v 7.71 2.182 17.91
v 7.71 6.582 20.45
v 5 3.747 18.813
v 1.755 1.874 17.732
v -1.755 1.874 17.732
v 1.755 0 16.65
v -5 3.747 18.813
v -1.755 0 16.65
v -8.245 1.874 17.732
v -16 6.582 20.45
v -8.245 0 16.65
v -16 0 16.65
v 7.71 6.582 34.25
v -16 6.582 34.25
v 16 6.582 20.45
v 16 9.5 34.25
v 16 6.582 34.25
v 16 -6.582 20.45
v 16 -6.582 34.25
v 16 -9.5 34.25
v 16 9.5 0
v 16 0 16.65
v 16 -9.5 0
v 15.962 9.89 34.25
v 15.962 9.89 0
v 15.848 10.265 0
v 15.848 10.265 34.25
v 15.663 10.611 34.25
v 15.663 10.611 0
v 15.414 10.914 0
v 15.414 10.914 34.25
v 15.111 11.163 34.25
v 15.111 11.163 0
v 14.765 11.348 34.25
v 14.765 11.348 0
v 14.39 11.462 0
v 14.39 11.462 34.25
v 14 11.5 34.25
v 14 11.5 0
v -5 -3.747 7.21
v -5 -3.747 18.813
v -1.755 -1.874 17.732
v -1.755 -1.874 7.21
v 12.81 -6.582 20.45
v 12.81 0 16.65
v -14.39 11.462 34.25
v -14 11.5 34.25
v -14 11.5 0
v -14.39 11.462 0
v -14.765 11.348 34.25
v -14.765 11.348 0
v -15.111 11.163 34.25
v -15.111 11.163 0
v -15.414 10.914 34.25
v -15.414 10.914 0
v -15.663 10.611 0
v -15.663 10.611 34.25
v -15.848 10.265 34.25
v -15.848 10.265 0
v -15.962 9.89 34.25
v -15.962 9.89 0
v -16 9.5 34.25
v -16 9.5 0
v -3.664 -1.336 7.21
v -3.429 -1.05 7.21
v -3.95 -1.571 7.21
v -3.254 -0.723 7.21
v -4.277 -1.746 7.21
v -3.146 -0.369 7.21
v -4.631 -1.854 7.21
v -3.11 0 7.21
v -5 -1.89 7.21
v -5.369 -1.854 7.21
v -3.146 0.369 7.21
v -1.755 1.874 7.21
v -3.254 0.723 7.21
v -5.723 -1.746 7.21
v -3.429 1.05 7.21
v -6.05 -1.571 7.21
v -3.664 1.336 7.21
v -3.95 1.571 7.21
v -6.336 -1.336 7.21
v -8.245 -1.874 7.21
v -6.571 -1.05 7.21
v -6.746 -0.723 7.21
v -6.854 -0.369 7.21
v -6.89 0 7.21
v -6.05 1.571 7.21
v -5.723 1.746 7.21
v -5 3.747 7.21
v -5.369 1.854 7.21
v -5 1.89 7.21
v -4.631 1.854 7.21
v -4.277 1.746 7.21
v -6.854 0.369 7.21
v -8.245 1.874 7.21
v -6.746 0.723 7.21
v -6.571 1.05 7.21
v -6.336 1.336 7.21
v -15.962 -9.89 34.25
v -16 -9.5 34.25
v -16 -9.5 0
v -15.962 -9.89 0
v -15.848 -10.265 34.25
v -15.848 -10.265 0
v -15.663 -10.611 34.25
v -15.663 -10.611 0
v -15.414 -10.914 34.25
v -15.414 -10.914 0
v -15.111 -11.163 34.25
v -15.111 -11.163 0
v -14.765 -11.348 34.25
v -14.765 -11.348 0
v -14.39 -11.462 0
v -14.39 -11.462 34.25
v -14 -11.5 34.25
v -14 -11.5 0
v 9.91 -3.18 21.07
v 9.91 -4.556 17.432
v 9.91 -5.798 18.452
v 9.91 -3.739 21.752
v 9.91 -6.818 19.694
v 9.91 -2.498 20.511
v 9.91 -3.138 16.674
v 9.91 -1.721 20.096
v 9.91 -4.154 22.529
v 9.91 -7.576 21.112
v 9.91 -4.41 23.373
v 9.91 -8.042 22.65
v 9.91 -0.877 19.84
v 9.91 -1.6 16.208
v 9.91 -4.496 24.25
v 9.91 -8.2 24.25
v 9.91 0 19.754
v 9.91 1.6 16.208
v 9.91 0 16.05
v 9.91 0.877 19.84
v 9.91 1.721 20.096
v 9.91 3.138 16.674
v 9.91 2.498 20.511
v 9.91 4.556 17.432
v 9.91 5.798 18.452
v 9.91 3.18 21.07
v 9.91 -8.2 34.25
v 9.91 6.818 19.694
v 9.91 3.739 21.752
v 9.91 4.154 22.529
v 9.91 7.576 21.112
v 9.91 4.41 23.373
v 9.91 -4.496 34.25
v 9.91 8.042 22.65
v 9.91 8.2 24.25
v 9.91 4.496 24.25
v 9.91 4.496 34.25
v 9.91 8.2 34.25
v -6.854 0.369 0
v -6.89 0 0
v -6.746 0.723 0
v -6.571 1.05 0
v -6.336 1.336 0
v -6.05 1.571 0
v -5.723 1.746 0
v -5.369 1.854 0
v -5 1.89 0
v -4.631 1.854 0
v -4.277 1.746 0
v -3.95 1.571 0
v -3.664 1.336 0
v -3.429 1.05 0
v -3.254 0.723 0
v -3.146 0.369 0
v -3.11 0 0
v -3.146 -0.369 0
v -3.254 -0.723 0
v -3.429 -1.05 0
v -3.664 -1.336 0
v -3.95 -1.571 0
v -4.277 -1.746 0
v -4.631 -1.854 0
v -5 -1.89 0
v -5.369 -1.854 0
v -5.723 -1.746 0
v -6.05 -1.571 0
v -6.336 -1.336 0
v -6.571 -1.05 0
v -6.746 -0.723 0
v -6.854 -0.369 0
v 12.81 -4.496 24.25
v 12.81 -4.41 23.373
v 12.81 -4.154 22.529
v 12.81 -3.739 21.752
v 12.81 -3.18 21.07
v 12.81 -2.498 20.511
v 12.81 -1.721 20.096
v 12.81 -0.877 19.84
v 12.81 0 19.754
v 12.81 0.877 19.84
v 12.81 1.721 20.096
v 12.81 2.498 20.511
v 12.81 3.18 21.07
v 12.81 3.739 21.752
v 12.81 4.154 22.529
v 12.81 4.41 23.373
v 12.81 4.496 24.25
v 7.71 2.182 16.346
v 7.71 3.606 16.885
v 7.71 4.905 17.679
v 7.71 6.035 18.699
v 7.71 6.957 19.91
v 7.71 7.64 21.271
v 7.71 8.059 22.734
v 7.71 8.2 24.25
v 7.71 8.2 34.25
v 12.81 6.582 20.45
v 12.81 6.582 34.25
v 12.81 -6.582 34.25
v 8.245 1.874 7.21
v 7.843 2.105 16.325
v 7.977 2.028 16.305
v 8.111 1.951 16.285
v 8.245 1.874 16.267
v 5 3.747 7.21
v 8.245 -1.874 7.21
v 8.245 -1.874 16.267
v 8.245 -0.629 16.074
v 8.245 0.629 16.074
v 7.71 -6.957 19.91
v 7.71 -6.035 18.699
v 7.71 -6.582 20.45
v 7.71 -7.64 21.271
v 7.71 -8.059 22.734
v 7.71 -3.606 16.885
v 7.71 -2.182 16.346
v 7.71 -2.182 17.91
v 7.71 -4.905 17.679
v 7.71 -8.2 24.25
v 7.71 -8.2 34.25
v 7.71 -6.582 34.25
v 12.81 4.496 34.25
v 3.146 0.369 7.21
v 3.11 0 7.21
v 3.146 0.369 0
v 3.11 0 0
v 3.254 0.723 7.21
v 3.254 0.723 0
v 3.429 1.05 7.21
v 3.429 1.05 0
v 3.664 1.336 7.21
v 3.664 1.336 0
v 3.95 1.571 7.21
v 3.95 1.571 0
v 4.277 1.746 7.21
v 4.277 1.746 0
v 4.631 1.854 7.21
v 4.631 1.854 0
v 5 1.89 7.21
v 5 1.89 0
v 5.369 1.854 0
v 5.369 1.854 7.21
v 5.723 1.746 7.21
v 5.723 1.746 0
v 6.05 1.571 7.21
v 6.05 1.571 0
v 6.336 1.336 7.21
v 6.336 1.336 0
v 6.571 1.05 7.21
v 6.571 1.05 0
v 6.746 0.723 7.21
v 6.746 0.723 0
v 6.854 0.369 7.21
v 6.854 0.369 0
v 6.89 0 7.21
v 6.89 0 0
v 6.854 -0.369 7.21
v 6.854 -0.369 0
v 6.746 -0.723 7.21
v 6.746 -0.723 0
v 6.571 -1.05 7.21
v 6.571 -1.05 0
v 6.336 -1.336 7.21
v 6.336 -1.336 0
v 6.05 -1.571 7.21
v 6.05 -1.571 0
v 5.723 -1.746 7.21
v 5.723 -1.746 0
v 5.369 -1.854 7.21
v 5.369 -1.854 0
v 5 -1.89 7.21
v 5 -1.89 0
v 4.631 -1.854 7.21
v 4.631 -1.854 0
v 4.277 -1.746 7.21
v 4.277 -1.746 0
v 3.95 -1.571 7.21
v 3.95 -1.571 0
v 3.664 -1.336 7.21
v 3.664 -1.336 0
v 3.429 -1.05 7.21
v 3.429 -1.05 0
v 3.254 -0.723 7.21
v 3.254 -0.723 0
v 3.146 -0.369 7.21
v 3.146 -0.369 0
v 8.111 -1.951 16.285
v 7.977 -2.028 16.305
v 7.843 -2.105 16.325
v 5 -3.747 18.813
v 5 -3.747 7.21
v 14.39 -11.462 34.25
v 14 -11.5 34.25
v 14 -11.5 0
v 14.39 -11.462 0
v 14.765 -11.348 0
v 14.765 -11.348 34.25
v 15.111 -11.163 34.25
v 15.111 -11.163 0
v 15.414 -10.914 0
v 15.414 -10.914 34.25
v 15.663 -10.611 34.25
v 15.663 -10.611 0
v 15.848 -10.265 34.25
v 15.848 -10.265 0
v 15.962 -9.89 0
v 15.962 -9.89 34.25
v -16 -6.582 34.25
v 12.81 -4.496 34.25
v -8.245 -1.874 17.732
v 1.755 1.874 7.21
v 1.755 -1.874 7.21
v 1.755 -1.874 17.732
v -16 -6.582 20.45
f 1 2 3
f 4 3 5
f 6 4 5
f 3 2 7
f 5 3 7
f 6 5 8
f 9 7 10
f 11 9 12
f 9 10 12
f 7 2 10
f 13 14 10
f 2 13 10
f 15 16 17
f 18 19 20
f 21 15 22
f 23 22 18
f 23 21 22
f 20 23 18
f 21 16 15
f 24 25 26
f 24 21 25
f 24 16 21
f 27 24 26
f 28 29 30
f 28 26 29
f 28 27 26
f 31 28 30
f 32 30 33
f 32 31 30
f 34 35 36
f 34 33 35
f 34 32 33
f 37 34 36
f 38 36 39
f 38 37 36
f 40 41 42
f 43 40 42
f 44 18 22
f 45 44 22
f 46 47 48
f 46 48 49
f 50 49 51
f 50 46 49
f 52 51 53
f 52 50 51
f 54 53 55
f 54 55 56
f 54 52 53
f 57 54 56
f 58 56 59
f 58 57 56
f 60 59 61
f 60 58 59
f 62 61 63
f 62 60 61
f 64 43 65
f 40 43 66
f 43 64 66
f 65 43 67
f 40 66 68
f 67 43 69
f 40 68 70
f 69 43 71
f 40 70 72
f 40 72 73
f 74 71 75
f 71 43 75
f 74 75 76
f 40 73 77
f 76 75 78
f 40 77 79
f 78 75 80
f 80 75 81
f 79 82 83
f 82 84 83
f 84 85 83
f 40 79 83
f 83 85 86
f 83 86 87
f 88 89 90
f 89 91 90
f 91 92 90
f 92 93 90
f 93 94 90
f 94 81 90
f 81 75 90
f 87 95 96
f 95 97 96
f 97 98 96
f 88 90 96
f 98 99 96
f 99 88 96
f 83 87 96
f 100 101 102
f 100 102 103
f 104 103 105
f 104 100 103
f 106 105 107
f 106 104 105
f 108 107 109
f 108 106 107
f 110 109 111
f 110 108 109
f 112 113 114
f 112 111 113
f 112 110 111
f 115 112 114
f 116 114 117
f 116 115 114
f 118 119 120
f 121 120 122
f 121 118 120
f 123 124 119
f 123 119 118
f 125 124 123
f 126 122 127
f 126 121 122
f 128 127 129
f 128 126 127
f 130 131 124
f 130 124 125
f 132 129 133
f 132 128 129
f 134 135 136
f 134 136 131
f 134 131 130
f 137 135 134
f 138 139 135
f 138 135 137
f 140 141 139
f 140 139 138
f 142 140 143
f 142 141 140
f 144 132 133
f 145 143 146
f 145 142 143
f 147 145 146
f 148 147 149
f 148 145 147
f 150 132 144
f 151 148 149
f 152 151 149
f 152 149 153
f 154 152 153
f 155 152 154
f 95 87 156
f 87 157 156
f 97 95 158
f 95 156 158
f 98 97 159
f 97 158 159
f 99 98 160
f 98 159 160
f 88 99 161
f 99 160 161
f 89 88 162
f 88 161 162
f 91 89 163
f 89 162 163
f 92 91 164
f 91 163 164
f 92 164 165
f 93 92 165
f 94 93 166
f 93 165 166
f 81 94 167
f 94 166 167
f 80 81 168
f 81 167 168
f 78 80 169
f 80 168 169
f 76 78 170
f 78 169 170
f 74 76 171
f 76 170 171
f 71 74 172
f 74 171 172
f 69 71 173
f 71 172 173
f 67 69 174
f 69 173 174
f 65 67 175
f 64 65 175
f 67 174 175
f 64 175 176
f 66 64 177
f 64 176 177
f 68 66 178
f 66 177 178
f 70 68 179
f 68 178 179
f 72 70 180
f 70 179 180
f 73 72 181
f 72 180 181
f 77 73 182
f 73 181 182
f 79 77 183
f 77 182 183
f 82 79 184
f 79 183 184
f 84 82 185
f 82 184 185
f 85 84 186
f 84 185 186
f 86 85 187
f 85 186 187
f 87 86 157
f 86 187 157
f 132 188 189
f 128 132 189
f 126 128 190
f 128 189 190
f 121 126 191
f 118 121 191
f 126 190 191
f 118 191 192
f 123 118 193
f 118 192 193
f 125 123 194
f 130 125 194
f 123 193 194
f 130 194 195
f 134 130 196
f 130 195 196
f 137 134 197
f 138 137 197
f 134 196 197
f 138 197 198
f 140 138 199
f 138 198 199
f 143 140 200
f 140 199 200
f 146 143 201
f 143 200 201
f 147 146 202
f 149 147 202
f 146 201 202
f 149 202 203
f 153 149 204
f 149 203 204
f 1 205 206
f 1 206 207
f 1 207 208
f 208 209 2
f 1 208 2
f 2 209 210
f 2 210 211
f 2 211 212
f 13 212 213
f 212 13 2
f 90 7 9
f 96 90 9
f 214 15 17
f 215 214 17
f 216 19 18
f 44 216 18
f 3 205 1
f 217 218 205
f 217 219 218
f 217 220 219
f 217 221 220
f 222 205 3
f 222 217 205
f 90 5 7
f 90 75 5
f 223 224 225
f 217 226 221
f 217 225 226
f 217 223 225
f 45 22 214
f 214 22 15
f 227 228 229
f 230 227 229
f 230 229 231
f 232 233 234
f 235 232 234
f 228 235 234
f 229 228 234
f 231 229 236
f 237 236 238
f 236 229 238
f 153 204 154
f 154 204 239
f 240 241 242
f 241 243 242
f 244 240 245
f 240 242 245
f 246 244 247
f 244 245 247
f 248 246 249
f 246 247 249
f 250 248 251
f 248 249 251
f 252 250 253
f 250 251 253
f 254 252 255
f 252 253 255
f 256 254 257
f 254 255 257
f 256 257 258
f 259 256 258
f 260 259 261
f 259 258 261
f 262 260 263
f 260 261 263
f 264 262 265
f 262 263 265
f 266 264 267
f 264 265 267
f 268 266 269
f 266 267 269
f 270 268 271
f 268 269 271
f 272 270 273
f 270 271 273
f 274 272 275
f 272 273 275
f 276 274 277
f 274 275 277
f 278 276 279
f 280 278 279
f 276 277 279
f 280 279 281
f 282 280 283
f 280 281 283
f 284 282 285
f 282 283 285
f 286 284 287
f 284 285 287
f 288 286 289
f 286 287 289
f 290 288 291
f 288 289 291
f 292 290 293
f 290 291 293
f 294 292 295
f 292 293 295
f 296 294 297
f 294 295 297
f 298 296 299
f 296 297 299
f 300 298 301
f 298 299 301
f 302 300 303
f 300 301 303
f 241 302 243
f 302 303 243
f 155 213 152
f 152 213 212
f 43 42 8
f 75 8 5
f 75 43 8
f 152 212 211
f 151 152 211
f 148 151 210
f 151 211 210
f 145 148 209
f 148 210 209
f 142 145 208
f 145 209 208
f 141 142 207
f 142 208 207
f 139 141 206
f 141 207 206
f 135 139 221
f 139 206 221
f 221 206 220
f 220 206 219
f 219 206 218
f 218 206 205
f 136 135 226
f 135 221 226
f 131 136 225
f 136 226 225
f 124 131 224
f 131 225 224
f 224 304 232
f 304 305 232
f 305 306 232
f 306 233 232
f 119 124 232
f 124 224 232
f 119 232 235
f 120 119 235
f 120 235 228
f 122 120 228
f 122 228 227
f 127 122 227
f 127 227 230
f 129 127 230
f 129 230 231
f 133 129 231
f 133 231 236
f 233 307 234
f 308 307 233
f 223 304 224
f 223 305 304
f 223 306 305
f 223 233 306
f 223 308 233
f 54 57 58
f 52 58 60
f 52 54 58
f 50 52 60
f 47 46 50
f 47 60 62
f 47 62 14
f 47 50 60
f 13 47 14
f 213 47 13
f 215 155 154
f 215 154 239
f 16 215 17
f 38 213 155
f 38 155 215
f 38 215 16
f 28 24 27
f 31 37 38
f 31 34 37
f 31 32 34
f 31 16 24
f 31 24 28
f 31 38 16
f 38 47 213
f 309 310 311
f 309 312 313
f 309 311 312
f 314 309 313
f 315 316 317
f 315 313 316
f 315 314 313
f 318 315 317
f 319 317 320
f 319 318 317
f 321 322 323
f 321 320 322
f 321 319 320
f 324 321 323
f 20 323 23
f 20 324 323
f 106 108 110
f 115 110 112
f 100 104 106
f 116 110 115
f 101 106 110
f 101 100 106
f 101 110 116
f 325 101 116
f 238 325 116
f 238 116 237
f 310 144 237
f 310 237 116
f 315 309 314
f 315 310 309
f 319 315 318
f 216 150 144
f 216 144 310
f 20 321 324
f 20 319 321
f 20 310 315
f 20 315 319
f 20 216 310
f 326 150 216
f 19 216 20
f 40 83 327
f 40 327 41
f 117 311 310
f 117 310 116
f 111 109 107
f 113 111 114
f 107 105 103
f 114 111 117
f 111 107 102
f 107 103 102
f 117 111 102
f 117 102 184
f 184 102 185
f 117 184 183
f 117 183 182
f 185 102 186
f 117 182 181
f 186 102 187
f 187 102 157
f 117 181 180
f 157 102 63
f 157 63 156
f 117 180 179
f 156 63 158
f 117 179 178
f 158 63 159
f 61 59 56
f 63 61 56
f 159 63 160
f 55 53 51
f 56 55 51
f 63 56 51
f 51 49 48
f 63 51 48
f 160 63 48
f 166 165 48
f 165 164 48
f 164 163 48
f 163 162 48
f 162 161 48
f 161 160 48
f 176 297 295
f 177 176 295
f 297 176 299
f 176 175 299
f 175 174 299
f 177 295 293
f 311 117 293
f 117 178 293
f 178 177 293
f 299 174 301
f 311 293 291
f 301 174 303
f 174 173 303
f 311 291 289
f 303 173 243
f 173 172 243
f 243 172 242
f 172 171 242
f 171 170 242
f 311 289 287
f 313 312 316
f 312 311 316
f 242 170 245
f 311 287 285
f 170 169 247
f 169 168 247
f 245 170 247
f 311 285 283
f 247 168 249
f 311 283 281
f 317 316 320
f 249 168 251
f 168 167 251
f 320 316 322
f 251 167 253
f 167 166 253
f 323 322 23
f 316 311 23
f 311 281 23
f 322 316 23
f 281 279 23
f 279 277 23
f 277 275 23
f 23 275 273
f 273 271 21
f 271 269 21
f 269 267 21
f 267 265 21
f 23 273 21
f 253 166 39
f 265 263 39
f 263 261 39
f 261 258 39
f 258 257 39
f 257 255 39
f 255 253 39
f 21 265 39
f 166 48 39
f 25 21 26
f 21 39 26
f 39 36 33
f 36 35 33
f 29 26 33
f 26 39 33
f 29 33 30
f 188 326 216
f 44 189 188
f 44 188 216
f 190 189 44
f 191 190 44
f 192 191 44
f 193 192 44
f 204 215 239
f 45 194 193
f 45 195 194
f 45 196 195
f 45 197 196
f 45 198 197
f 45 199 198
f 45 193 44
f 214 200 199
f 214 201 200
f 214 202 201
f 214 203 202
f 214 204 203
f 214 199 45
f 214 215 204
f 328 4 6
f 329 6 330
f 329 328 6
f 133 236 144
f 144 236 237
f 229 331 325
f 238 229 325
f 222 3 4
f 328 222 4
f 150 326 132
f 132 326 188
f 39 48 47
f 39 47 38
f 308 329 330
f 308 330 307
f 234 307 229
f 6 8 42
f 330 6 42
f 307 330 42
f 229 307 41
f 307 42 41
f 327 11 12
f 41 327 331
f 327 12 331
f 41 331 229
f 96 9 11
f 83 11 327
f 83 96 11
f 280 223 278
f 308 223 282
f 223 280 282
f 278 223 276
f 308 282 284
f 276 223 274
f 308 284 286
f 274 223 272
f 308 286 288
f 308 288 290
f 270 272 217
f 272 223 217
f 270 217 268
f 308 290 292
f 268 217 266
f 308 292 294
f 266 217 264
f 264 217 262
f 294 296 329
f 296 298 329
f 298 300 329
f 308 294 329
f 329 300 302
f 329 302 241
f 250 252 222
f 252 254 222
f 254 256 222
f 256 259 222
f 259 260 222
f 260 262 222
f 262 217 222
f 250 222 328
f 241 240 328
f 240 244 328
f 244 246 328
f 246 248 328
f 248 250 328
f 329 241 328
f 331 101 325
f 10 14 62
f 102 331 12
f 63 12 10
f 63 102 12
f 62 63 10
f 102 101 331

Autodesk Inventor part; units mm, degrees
sketch "Boceto1" plane through (0, 0, 0) normal (0, 0, 1) x (1, 0, 0)
  line L0 (-16, 11.5) -> (16, 11.5)
  line L1 (16, 11.5) -> (16, -11.5)
  line L2 (16, -11.5) -> (-16, -11.5)
  line L3 (-16, -11.5) -> (-16, 11.5)
  point P0 (0, 0)
  point P1 (16, 0)
  point P2 (0, 11.5)
  dimension "d0" = 32
  dimension "d1" = 23
extrude "Extrusión1" add sketch "Boceto1" along normal blind 34.25
fillet "Empalme1" radius 2 4 edges at (16, -11.5, 17.125) (16, 11.5, 17.125) (-16, 11.5, 17.125) (-16, -11.5, 17.125)
sketch "Boceto2" plane through (16, -9.5, 0) normal (1, 0, 0) x (0, 0, -1)
  line L0 (-34.25, 0) -> (-34.25, 19) projected
  line L1 (-34.25, 2.918) -> (-20.45, 2.918)
  line L2 (-20.45, 2.918) -> (-16.6504, 9.5)
  line L3 (-16.6504, 9.5) -> (-20.45, 16.082)
  line L4 (-20.45, 16.082) -> (-34.25, 16.082)
  line L5 (-34.25, 2.918) -> (-34.25, 16.082)
  point P0 (0, 9.5)
  point P1 (-34.25, 9.5)
  dimension "d5" = 13.8
  dimension "d6" = 7.6
  dimension "d7" = 13.164
extrude "Extrusión2" cut sketch "Boceto2" against normal blind 3.19
sketch "Boceto3" plane through (12.81, -9.5, 0) normal (1, 0, 0) x (0, 0, -1)
  line L0 (-20.45, 2.918) -> (-34.25, 2.918) projected
  line L1 (-16.6504, 9.5) -> (-20.45, 2.918) projected
  line L2 (-20.45, 16.082) -> (-16.6504, 9.5) projected
  line L3 (-34.25, 16.082) -> (-20.45, 16.082) projected
  line L4 (-34.25, 2.918) -> (-34.25, 16.082) projected
  line L5 (-34.25, 5.0035) -> (-24.25, 5.0035)
  arc A0 (-24.25, 5.0035) -> (-24.25, 13.9965) centre (-24.25, 9.5) ccw
  line L6 (-24.25, 13.9965) -> (-34.25, 13.9965)
  line L7 (-34.25, 2.918) -> (-34.25, 16.082) projected
  line L8 (-34.25, 5.0035) -> (-34.25, 13.9965)
  point P0 (0, 9.5)
  point P1 (-34.25, 9.5)
  dimension "d10" = 10
  dimension "d11" = 8.993
extrude "Extrusión3" cut sketch "Boceto3" against normal blind 2.9 contours L4 L6 A0 L5
sketch "Boceto4" plane through (-16, -9.5, 0) normal (-1, 0, 0) x (0, 0, 1)
  line L0 (34.25, 16.082) -> (20.45, 16.082) projected
  line L1 (20.45, 16.082) -> (16.6504, 9.5) projected
  line L2 (16.6504, 9.5) -> (20.45, 2.918) projected
  line L3 (20.45, 2.918) -> (34.25, 2.918) projected
  line L4 (34.25, 16.082) -> (34.25, 2.918)
  line L5 (34.25, 0) -> (34.25, 2.918) projected
  point P0 (0, 9.5)
extrude "Extrusión4" cut sketch "Boceto4" against normal blind 23.71
sketch "Boceto5" plane through (7.71, -9.5, 0) normal (-1, 0, 0) x (0, 0, 1)
  line L0 (34.25, 17.7) -> (24.25, 17.7)
  arc A0 (24.25, 17.7) -> (24.25, 1.3) centre (24.25, 9.5) ccw
  line L1 (24.25, 1.3) -> (34.25, 1.3)
  line L2 (20.45, 2.918) -> (34.25, 2.918) projected
  line L3 (34.25, 5.0035) -> (34.25, 13.9965) projected
  line L4 (34.25, 17.7) -> (34.25, 1.3)
  line L5 (34.25, 0) -> (34.25, 2.918) projected
  point P0 (0, 9.5)
  point P1 (34.25, 9.5)
  dimension "d16" = 10
  dimension "d17" = 16.4
extrude "Extrusión5" cut sketch "Boceto5" against normal up to surface (2.2 mm away)
sketch "Boceto6" plane through (0, 0, 0) normal (0, 0, -1) x (-1, 0, 0)
  line L0 (16, 0) -> (-7.71, 0) projected
  circle A0 centre (5, 0) radius 1.89
  circle A1 centre (-5, 0) radius 1.89
  line L1 (16, -9.5) -> (16, 9.5) projected
  point P0 (0, 0)
  dimension "d20" = 3.78
  dimension "d21" = 3.78
  dimension "d22" = 10
  dimension "d23" = 11
extrude "Extrusión6" cut sketch "Boceto6" against normal blind 7.21
sketch "Boceto7" plane through (-5, 0, 7.21) normal (0, 0, -1) x (-1, 0, 0)
  circle A0 centre (0, 0) radius 1.89 projected
  circle A1 centre (-10, 0) radius 1.89 projected
  line L0 (3.245, -1.8735) -> (0, -3.747)
  line L1 (0, -3.747) -> (-3.245, -1.8735)
  line L2 (-3.245, -1.8735) -> (-3.245, 1.8735)
  line L3 (-3.245, 1.8735) -> (0, 3.747)
  line L4 (0, 3.747) -> (3.245, 1.8735)
  line L5 (3.245, 1.8735) -> (3.245, -1.8735)
  line L6 (-6.755, -1.8735) -> (-10, -3.747)
  line L7 (-10, -3.747) -> (-13.245, -1.8735)
  line L8 (-13.245, -1.8735) -> (-13.245, 1.8735)
  line L9 (-13.245, 1.8735) -> (-10, 3.747)
  line L10 (-10, 3.747) -> (-6.755, 1.8735)
  line L11 (-6.755, 1.8735) -> (-6.755, -1.8735)
  point P0 (-5, 0)
  dimension "d26" = 3.747
  dimension "d27" = 3.747
extrude "Extrusión7" cut sketch "Boceto7" against normal through all contours A0 | A1 | L0 L1 L2 L3 L4 L5 | L6 L7 L8 L9 L10 L11
ref_plane "Plano de trabajo1" through (0, -9.5, 0) normal (-1, 0, 0) x (0, 0, 1)
